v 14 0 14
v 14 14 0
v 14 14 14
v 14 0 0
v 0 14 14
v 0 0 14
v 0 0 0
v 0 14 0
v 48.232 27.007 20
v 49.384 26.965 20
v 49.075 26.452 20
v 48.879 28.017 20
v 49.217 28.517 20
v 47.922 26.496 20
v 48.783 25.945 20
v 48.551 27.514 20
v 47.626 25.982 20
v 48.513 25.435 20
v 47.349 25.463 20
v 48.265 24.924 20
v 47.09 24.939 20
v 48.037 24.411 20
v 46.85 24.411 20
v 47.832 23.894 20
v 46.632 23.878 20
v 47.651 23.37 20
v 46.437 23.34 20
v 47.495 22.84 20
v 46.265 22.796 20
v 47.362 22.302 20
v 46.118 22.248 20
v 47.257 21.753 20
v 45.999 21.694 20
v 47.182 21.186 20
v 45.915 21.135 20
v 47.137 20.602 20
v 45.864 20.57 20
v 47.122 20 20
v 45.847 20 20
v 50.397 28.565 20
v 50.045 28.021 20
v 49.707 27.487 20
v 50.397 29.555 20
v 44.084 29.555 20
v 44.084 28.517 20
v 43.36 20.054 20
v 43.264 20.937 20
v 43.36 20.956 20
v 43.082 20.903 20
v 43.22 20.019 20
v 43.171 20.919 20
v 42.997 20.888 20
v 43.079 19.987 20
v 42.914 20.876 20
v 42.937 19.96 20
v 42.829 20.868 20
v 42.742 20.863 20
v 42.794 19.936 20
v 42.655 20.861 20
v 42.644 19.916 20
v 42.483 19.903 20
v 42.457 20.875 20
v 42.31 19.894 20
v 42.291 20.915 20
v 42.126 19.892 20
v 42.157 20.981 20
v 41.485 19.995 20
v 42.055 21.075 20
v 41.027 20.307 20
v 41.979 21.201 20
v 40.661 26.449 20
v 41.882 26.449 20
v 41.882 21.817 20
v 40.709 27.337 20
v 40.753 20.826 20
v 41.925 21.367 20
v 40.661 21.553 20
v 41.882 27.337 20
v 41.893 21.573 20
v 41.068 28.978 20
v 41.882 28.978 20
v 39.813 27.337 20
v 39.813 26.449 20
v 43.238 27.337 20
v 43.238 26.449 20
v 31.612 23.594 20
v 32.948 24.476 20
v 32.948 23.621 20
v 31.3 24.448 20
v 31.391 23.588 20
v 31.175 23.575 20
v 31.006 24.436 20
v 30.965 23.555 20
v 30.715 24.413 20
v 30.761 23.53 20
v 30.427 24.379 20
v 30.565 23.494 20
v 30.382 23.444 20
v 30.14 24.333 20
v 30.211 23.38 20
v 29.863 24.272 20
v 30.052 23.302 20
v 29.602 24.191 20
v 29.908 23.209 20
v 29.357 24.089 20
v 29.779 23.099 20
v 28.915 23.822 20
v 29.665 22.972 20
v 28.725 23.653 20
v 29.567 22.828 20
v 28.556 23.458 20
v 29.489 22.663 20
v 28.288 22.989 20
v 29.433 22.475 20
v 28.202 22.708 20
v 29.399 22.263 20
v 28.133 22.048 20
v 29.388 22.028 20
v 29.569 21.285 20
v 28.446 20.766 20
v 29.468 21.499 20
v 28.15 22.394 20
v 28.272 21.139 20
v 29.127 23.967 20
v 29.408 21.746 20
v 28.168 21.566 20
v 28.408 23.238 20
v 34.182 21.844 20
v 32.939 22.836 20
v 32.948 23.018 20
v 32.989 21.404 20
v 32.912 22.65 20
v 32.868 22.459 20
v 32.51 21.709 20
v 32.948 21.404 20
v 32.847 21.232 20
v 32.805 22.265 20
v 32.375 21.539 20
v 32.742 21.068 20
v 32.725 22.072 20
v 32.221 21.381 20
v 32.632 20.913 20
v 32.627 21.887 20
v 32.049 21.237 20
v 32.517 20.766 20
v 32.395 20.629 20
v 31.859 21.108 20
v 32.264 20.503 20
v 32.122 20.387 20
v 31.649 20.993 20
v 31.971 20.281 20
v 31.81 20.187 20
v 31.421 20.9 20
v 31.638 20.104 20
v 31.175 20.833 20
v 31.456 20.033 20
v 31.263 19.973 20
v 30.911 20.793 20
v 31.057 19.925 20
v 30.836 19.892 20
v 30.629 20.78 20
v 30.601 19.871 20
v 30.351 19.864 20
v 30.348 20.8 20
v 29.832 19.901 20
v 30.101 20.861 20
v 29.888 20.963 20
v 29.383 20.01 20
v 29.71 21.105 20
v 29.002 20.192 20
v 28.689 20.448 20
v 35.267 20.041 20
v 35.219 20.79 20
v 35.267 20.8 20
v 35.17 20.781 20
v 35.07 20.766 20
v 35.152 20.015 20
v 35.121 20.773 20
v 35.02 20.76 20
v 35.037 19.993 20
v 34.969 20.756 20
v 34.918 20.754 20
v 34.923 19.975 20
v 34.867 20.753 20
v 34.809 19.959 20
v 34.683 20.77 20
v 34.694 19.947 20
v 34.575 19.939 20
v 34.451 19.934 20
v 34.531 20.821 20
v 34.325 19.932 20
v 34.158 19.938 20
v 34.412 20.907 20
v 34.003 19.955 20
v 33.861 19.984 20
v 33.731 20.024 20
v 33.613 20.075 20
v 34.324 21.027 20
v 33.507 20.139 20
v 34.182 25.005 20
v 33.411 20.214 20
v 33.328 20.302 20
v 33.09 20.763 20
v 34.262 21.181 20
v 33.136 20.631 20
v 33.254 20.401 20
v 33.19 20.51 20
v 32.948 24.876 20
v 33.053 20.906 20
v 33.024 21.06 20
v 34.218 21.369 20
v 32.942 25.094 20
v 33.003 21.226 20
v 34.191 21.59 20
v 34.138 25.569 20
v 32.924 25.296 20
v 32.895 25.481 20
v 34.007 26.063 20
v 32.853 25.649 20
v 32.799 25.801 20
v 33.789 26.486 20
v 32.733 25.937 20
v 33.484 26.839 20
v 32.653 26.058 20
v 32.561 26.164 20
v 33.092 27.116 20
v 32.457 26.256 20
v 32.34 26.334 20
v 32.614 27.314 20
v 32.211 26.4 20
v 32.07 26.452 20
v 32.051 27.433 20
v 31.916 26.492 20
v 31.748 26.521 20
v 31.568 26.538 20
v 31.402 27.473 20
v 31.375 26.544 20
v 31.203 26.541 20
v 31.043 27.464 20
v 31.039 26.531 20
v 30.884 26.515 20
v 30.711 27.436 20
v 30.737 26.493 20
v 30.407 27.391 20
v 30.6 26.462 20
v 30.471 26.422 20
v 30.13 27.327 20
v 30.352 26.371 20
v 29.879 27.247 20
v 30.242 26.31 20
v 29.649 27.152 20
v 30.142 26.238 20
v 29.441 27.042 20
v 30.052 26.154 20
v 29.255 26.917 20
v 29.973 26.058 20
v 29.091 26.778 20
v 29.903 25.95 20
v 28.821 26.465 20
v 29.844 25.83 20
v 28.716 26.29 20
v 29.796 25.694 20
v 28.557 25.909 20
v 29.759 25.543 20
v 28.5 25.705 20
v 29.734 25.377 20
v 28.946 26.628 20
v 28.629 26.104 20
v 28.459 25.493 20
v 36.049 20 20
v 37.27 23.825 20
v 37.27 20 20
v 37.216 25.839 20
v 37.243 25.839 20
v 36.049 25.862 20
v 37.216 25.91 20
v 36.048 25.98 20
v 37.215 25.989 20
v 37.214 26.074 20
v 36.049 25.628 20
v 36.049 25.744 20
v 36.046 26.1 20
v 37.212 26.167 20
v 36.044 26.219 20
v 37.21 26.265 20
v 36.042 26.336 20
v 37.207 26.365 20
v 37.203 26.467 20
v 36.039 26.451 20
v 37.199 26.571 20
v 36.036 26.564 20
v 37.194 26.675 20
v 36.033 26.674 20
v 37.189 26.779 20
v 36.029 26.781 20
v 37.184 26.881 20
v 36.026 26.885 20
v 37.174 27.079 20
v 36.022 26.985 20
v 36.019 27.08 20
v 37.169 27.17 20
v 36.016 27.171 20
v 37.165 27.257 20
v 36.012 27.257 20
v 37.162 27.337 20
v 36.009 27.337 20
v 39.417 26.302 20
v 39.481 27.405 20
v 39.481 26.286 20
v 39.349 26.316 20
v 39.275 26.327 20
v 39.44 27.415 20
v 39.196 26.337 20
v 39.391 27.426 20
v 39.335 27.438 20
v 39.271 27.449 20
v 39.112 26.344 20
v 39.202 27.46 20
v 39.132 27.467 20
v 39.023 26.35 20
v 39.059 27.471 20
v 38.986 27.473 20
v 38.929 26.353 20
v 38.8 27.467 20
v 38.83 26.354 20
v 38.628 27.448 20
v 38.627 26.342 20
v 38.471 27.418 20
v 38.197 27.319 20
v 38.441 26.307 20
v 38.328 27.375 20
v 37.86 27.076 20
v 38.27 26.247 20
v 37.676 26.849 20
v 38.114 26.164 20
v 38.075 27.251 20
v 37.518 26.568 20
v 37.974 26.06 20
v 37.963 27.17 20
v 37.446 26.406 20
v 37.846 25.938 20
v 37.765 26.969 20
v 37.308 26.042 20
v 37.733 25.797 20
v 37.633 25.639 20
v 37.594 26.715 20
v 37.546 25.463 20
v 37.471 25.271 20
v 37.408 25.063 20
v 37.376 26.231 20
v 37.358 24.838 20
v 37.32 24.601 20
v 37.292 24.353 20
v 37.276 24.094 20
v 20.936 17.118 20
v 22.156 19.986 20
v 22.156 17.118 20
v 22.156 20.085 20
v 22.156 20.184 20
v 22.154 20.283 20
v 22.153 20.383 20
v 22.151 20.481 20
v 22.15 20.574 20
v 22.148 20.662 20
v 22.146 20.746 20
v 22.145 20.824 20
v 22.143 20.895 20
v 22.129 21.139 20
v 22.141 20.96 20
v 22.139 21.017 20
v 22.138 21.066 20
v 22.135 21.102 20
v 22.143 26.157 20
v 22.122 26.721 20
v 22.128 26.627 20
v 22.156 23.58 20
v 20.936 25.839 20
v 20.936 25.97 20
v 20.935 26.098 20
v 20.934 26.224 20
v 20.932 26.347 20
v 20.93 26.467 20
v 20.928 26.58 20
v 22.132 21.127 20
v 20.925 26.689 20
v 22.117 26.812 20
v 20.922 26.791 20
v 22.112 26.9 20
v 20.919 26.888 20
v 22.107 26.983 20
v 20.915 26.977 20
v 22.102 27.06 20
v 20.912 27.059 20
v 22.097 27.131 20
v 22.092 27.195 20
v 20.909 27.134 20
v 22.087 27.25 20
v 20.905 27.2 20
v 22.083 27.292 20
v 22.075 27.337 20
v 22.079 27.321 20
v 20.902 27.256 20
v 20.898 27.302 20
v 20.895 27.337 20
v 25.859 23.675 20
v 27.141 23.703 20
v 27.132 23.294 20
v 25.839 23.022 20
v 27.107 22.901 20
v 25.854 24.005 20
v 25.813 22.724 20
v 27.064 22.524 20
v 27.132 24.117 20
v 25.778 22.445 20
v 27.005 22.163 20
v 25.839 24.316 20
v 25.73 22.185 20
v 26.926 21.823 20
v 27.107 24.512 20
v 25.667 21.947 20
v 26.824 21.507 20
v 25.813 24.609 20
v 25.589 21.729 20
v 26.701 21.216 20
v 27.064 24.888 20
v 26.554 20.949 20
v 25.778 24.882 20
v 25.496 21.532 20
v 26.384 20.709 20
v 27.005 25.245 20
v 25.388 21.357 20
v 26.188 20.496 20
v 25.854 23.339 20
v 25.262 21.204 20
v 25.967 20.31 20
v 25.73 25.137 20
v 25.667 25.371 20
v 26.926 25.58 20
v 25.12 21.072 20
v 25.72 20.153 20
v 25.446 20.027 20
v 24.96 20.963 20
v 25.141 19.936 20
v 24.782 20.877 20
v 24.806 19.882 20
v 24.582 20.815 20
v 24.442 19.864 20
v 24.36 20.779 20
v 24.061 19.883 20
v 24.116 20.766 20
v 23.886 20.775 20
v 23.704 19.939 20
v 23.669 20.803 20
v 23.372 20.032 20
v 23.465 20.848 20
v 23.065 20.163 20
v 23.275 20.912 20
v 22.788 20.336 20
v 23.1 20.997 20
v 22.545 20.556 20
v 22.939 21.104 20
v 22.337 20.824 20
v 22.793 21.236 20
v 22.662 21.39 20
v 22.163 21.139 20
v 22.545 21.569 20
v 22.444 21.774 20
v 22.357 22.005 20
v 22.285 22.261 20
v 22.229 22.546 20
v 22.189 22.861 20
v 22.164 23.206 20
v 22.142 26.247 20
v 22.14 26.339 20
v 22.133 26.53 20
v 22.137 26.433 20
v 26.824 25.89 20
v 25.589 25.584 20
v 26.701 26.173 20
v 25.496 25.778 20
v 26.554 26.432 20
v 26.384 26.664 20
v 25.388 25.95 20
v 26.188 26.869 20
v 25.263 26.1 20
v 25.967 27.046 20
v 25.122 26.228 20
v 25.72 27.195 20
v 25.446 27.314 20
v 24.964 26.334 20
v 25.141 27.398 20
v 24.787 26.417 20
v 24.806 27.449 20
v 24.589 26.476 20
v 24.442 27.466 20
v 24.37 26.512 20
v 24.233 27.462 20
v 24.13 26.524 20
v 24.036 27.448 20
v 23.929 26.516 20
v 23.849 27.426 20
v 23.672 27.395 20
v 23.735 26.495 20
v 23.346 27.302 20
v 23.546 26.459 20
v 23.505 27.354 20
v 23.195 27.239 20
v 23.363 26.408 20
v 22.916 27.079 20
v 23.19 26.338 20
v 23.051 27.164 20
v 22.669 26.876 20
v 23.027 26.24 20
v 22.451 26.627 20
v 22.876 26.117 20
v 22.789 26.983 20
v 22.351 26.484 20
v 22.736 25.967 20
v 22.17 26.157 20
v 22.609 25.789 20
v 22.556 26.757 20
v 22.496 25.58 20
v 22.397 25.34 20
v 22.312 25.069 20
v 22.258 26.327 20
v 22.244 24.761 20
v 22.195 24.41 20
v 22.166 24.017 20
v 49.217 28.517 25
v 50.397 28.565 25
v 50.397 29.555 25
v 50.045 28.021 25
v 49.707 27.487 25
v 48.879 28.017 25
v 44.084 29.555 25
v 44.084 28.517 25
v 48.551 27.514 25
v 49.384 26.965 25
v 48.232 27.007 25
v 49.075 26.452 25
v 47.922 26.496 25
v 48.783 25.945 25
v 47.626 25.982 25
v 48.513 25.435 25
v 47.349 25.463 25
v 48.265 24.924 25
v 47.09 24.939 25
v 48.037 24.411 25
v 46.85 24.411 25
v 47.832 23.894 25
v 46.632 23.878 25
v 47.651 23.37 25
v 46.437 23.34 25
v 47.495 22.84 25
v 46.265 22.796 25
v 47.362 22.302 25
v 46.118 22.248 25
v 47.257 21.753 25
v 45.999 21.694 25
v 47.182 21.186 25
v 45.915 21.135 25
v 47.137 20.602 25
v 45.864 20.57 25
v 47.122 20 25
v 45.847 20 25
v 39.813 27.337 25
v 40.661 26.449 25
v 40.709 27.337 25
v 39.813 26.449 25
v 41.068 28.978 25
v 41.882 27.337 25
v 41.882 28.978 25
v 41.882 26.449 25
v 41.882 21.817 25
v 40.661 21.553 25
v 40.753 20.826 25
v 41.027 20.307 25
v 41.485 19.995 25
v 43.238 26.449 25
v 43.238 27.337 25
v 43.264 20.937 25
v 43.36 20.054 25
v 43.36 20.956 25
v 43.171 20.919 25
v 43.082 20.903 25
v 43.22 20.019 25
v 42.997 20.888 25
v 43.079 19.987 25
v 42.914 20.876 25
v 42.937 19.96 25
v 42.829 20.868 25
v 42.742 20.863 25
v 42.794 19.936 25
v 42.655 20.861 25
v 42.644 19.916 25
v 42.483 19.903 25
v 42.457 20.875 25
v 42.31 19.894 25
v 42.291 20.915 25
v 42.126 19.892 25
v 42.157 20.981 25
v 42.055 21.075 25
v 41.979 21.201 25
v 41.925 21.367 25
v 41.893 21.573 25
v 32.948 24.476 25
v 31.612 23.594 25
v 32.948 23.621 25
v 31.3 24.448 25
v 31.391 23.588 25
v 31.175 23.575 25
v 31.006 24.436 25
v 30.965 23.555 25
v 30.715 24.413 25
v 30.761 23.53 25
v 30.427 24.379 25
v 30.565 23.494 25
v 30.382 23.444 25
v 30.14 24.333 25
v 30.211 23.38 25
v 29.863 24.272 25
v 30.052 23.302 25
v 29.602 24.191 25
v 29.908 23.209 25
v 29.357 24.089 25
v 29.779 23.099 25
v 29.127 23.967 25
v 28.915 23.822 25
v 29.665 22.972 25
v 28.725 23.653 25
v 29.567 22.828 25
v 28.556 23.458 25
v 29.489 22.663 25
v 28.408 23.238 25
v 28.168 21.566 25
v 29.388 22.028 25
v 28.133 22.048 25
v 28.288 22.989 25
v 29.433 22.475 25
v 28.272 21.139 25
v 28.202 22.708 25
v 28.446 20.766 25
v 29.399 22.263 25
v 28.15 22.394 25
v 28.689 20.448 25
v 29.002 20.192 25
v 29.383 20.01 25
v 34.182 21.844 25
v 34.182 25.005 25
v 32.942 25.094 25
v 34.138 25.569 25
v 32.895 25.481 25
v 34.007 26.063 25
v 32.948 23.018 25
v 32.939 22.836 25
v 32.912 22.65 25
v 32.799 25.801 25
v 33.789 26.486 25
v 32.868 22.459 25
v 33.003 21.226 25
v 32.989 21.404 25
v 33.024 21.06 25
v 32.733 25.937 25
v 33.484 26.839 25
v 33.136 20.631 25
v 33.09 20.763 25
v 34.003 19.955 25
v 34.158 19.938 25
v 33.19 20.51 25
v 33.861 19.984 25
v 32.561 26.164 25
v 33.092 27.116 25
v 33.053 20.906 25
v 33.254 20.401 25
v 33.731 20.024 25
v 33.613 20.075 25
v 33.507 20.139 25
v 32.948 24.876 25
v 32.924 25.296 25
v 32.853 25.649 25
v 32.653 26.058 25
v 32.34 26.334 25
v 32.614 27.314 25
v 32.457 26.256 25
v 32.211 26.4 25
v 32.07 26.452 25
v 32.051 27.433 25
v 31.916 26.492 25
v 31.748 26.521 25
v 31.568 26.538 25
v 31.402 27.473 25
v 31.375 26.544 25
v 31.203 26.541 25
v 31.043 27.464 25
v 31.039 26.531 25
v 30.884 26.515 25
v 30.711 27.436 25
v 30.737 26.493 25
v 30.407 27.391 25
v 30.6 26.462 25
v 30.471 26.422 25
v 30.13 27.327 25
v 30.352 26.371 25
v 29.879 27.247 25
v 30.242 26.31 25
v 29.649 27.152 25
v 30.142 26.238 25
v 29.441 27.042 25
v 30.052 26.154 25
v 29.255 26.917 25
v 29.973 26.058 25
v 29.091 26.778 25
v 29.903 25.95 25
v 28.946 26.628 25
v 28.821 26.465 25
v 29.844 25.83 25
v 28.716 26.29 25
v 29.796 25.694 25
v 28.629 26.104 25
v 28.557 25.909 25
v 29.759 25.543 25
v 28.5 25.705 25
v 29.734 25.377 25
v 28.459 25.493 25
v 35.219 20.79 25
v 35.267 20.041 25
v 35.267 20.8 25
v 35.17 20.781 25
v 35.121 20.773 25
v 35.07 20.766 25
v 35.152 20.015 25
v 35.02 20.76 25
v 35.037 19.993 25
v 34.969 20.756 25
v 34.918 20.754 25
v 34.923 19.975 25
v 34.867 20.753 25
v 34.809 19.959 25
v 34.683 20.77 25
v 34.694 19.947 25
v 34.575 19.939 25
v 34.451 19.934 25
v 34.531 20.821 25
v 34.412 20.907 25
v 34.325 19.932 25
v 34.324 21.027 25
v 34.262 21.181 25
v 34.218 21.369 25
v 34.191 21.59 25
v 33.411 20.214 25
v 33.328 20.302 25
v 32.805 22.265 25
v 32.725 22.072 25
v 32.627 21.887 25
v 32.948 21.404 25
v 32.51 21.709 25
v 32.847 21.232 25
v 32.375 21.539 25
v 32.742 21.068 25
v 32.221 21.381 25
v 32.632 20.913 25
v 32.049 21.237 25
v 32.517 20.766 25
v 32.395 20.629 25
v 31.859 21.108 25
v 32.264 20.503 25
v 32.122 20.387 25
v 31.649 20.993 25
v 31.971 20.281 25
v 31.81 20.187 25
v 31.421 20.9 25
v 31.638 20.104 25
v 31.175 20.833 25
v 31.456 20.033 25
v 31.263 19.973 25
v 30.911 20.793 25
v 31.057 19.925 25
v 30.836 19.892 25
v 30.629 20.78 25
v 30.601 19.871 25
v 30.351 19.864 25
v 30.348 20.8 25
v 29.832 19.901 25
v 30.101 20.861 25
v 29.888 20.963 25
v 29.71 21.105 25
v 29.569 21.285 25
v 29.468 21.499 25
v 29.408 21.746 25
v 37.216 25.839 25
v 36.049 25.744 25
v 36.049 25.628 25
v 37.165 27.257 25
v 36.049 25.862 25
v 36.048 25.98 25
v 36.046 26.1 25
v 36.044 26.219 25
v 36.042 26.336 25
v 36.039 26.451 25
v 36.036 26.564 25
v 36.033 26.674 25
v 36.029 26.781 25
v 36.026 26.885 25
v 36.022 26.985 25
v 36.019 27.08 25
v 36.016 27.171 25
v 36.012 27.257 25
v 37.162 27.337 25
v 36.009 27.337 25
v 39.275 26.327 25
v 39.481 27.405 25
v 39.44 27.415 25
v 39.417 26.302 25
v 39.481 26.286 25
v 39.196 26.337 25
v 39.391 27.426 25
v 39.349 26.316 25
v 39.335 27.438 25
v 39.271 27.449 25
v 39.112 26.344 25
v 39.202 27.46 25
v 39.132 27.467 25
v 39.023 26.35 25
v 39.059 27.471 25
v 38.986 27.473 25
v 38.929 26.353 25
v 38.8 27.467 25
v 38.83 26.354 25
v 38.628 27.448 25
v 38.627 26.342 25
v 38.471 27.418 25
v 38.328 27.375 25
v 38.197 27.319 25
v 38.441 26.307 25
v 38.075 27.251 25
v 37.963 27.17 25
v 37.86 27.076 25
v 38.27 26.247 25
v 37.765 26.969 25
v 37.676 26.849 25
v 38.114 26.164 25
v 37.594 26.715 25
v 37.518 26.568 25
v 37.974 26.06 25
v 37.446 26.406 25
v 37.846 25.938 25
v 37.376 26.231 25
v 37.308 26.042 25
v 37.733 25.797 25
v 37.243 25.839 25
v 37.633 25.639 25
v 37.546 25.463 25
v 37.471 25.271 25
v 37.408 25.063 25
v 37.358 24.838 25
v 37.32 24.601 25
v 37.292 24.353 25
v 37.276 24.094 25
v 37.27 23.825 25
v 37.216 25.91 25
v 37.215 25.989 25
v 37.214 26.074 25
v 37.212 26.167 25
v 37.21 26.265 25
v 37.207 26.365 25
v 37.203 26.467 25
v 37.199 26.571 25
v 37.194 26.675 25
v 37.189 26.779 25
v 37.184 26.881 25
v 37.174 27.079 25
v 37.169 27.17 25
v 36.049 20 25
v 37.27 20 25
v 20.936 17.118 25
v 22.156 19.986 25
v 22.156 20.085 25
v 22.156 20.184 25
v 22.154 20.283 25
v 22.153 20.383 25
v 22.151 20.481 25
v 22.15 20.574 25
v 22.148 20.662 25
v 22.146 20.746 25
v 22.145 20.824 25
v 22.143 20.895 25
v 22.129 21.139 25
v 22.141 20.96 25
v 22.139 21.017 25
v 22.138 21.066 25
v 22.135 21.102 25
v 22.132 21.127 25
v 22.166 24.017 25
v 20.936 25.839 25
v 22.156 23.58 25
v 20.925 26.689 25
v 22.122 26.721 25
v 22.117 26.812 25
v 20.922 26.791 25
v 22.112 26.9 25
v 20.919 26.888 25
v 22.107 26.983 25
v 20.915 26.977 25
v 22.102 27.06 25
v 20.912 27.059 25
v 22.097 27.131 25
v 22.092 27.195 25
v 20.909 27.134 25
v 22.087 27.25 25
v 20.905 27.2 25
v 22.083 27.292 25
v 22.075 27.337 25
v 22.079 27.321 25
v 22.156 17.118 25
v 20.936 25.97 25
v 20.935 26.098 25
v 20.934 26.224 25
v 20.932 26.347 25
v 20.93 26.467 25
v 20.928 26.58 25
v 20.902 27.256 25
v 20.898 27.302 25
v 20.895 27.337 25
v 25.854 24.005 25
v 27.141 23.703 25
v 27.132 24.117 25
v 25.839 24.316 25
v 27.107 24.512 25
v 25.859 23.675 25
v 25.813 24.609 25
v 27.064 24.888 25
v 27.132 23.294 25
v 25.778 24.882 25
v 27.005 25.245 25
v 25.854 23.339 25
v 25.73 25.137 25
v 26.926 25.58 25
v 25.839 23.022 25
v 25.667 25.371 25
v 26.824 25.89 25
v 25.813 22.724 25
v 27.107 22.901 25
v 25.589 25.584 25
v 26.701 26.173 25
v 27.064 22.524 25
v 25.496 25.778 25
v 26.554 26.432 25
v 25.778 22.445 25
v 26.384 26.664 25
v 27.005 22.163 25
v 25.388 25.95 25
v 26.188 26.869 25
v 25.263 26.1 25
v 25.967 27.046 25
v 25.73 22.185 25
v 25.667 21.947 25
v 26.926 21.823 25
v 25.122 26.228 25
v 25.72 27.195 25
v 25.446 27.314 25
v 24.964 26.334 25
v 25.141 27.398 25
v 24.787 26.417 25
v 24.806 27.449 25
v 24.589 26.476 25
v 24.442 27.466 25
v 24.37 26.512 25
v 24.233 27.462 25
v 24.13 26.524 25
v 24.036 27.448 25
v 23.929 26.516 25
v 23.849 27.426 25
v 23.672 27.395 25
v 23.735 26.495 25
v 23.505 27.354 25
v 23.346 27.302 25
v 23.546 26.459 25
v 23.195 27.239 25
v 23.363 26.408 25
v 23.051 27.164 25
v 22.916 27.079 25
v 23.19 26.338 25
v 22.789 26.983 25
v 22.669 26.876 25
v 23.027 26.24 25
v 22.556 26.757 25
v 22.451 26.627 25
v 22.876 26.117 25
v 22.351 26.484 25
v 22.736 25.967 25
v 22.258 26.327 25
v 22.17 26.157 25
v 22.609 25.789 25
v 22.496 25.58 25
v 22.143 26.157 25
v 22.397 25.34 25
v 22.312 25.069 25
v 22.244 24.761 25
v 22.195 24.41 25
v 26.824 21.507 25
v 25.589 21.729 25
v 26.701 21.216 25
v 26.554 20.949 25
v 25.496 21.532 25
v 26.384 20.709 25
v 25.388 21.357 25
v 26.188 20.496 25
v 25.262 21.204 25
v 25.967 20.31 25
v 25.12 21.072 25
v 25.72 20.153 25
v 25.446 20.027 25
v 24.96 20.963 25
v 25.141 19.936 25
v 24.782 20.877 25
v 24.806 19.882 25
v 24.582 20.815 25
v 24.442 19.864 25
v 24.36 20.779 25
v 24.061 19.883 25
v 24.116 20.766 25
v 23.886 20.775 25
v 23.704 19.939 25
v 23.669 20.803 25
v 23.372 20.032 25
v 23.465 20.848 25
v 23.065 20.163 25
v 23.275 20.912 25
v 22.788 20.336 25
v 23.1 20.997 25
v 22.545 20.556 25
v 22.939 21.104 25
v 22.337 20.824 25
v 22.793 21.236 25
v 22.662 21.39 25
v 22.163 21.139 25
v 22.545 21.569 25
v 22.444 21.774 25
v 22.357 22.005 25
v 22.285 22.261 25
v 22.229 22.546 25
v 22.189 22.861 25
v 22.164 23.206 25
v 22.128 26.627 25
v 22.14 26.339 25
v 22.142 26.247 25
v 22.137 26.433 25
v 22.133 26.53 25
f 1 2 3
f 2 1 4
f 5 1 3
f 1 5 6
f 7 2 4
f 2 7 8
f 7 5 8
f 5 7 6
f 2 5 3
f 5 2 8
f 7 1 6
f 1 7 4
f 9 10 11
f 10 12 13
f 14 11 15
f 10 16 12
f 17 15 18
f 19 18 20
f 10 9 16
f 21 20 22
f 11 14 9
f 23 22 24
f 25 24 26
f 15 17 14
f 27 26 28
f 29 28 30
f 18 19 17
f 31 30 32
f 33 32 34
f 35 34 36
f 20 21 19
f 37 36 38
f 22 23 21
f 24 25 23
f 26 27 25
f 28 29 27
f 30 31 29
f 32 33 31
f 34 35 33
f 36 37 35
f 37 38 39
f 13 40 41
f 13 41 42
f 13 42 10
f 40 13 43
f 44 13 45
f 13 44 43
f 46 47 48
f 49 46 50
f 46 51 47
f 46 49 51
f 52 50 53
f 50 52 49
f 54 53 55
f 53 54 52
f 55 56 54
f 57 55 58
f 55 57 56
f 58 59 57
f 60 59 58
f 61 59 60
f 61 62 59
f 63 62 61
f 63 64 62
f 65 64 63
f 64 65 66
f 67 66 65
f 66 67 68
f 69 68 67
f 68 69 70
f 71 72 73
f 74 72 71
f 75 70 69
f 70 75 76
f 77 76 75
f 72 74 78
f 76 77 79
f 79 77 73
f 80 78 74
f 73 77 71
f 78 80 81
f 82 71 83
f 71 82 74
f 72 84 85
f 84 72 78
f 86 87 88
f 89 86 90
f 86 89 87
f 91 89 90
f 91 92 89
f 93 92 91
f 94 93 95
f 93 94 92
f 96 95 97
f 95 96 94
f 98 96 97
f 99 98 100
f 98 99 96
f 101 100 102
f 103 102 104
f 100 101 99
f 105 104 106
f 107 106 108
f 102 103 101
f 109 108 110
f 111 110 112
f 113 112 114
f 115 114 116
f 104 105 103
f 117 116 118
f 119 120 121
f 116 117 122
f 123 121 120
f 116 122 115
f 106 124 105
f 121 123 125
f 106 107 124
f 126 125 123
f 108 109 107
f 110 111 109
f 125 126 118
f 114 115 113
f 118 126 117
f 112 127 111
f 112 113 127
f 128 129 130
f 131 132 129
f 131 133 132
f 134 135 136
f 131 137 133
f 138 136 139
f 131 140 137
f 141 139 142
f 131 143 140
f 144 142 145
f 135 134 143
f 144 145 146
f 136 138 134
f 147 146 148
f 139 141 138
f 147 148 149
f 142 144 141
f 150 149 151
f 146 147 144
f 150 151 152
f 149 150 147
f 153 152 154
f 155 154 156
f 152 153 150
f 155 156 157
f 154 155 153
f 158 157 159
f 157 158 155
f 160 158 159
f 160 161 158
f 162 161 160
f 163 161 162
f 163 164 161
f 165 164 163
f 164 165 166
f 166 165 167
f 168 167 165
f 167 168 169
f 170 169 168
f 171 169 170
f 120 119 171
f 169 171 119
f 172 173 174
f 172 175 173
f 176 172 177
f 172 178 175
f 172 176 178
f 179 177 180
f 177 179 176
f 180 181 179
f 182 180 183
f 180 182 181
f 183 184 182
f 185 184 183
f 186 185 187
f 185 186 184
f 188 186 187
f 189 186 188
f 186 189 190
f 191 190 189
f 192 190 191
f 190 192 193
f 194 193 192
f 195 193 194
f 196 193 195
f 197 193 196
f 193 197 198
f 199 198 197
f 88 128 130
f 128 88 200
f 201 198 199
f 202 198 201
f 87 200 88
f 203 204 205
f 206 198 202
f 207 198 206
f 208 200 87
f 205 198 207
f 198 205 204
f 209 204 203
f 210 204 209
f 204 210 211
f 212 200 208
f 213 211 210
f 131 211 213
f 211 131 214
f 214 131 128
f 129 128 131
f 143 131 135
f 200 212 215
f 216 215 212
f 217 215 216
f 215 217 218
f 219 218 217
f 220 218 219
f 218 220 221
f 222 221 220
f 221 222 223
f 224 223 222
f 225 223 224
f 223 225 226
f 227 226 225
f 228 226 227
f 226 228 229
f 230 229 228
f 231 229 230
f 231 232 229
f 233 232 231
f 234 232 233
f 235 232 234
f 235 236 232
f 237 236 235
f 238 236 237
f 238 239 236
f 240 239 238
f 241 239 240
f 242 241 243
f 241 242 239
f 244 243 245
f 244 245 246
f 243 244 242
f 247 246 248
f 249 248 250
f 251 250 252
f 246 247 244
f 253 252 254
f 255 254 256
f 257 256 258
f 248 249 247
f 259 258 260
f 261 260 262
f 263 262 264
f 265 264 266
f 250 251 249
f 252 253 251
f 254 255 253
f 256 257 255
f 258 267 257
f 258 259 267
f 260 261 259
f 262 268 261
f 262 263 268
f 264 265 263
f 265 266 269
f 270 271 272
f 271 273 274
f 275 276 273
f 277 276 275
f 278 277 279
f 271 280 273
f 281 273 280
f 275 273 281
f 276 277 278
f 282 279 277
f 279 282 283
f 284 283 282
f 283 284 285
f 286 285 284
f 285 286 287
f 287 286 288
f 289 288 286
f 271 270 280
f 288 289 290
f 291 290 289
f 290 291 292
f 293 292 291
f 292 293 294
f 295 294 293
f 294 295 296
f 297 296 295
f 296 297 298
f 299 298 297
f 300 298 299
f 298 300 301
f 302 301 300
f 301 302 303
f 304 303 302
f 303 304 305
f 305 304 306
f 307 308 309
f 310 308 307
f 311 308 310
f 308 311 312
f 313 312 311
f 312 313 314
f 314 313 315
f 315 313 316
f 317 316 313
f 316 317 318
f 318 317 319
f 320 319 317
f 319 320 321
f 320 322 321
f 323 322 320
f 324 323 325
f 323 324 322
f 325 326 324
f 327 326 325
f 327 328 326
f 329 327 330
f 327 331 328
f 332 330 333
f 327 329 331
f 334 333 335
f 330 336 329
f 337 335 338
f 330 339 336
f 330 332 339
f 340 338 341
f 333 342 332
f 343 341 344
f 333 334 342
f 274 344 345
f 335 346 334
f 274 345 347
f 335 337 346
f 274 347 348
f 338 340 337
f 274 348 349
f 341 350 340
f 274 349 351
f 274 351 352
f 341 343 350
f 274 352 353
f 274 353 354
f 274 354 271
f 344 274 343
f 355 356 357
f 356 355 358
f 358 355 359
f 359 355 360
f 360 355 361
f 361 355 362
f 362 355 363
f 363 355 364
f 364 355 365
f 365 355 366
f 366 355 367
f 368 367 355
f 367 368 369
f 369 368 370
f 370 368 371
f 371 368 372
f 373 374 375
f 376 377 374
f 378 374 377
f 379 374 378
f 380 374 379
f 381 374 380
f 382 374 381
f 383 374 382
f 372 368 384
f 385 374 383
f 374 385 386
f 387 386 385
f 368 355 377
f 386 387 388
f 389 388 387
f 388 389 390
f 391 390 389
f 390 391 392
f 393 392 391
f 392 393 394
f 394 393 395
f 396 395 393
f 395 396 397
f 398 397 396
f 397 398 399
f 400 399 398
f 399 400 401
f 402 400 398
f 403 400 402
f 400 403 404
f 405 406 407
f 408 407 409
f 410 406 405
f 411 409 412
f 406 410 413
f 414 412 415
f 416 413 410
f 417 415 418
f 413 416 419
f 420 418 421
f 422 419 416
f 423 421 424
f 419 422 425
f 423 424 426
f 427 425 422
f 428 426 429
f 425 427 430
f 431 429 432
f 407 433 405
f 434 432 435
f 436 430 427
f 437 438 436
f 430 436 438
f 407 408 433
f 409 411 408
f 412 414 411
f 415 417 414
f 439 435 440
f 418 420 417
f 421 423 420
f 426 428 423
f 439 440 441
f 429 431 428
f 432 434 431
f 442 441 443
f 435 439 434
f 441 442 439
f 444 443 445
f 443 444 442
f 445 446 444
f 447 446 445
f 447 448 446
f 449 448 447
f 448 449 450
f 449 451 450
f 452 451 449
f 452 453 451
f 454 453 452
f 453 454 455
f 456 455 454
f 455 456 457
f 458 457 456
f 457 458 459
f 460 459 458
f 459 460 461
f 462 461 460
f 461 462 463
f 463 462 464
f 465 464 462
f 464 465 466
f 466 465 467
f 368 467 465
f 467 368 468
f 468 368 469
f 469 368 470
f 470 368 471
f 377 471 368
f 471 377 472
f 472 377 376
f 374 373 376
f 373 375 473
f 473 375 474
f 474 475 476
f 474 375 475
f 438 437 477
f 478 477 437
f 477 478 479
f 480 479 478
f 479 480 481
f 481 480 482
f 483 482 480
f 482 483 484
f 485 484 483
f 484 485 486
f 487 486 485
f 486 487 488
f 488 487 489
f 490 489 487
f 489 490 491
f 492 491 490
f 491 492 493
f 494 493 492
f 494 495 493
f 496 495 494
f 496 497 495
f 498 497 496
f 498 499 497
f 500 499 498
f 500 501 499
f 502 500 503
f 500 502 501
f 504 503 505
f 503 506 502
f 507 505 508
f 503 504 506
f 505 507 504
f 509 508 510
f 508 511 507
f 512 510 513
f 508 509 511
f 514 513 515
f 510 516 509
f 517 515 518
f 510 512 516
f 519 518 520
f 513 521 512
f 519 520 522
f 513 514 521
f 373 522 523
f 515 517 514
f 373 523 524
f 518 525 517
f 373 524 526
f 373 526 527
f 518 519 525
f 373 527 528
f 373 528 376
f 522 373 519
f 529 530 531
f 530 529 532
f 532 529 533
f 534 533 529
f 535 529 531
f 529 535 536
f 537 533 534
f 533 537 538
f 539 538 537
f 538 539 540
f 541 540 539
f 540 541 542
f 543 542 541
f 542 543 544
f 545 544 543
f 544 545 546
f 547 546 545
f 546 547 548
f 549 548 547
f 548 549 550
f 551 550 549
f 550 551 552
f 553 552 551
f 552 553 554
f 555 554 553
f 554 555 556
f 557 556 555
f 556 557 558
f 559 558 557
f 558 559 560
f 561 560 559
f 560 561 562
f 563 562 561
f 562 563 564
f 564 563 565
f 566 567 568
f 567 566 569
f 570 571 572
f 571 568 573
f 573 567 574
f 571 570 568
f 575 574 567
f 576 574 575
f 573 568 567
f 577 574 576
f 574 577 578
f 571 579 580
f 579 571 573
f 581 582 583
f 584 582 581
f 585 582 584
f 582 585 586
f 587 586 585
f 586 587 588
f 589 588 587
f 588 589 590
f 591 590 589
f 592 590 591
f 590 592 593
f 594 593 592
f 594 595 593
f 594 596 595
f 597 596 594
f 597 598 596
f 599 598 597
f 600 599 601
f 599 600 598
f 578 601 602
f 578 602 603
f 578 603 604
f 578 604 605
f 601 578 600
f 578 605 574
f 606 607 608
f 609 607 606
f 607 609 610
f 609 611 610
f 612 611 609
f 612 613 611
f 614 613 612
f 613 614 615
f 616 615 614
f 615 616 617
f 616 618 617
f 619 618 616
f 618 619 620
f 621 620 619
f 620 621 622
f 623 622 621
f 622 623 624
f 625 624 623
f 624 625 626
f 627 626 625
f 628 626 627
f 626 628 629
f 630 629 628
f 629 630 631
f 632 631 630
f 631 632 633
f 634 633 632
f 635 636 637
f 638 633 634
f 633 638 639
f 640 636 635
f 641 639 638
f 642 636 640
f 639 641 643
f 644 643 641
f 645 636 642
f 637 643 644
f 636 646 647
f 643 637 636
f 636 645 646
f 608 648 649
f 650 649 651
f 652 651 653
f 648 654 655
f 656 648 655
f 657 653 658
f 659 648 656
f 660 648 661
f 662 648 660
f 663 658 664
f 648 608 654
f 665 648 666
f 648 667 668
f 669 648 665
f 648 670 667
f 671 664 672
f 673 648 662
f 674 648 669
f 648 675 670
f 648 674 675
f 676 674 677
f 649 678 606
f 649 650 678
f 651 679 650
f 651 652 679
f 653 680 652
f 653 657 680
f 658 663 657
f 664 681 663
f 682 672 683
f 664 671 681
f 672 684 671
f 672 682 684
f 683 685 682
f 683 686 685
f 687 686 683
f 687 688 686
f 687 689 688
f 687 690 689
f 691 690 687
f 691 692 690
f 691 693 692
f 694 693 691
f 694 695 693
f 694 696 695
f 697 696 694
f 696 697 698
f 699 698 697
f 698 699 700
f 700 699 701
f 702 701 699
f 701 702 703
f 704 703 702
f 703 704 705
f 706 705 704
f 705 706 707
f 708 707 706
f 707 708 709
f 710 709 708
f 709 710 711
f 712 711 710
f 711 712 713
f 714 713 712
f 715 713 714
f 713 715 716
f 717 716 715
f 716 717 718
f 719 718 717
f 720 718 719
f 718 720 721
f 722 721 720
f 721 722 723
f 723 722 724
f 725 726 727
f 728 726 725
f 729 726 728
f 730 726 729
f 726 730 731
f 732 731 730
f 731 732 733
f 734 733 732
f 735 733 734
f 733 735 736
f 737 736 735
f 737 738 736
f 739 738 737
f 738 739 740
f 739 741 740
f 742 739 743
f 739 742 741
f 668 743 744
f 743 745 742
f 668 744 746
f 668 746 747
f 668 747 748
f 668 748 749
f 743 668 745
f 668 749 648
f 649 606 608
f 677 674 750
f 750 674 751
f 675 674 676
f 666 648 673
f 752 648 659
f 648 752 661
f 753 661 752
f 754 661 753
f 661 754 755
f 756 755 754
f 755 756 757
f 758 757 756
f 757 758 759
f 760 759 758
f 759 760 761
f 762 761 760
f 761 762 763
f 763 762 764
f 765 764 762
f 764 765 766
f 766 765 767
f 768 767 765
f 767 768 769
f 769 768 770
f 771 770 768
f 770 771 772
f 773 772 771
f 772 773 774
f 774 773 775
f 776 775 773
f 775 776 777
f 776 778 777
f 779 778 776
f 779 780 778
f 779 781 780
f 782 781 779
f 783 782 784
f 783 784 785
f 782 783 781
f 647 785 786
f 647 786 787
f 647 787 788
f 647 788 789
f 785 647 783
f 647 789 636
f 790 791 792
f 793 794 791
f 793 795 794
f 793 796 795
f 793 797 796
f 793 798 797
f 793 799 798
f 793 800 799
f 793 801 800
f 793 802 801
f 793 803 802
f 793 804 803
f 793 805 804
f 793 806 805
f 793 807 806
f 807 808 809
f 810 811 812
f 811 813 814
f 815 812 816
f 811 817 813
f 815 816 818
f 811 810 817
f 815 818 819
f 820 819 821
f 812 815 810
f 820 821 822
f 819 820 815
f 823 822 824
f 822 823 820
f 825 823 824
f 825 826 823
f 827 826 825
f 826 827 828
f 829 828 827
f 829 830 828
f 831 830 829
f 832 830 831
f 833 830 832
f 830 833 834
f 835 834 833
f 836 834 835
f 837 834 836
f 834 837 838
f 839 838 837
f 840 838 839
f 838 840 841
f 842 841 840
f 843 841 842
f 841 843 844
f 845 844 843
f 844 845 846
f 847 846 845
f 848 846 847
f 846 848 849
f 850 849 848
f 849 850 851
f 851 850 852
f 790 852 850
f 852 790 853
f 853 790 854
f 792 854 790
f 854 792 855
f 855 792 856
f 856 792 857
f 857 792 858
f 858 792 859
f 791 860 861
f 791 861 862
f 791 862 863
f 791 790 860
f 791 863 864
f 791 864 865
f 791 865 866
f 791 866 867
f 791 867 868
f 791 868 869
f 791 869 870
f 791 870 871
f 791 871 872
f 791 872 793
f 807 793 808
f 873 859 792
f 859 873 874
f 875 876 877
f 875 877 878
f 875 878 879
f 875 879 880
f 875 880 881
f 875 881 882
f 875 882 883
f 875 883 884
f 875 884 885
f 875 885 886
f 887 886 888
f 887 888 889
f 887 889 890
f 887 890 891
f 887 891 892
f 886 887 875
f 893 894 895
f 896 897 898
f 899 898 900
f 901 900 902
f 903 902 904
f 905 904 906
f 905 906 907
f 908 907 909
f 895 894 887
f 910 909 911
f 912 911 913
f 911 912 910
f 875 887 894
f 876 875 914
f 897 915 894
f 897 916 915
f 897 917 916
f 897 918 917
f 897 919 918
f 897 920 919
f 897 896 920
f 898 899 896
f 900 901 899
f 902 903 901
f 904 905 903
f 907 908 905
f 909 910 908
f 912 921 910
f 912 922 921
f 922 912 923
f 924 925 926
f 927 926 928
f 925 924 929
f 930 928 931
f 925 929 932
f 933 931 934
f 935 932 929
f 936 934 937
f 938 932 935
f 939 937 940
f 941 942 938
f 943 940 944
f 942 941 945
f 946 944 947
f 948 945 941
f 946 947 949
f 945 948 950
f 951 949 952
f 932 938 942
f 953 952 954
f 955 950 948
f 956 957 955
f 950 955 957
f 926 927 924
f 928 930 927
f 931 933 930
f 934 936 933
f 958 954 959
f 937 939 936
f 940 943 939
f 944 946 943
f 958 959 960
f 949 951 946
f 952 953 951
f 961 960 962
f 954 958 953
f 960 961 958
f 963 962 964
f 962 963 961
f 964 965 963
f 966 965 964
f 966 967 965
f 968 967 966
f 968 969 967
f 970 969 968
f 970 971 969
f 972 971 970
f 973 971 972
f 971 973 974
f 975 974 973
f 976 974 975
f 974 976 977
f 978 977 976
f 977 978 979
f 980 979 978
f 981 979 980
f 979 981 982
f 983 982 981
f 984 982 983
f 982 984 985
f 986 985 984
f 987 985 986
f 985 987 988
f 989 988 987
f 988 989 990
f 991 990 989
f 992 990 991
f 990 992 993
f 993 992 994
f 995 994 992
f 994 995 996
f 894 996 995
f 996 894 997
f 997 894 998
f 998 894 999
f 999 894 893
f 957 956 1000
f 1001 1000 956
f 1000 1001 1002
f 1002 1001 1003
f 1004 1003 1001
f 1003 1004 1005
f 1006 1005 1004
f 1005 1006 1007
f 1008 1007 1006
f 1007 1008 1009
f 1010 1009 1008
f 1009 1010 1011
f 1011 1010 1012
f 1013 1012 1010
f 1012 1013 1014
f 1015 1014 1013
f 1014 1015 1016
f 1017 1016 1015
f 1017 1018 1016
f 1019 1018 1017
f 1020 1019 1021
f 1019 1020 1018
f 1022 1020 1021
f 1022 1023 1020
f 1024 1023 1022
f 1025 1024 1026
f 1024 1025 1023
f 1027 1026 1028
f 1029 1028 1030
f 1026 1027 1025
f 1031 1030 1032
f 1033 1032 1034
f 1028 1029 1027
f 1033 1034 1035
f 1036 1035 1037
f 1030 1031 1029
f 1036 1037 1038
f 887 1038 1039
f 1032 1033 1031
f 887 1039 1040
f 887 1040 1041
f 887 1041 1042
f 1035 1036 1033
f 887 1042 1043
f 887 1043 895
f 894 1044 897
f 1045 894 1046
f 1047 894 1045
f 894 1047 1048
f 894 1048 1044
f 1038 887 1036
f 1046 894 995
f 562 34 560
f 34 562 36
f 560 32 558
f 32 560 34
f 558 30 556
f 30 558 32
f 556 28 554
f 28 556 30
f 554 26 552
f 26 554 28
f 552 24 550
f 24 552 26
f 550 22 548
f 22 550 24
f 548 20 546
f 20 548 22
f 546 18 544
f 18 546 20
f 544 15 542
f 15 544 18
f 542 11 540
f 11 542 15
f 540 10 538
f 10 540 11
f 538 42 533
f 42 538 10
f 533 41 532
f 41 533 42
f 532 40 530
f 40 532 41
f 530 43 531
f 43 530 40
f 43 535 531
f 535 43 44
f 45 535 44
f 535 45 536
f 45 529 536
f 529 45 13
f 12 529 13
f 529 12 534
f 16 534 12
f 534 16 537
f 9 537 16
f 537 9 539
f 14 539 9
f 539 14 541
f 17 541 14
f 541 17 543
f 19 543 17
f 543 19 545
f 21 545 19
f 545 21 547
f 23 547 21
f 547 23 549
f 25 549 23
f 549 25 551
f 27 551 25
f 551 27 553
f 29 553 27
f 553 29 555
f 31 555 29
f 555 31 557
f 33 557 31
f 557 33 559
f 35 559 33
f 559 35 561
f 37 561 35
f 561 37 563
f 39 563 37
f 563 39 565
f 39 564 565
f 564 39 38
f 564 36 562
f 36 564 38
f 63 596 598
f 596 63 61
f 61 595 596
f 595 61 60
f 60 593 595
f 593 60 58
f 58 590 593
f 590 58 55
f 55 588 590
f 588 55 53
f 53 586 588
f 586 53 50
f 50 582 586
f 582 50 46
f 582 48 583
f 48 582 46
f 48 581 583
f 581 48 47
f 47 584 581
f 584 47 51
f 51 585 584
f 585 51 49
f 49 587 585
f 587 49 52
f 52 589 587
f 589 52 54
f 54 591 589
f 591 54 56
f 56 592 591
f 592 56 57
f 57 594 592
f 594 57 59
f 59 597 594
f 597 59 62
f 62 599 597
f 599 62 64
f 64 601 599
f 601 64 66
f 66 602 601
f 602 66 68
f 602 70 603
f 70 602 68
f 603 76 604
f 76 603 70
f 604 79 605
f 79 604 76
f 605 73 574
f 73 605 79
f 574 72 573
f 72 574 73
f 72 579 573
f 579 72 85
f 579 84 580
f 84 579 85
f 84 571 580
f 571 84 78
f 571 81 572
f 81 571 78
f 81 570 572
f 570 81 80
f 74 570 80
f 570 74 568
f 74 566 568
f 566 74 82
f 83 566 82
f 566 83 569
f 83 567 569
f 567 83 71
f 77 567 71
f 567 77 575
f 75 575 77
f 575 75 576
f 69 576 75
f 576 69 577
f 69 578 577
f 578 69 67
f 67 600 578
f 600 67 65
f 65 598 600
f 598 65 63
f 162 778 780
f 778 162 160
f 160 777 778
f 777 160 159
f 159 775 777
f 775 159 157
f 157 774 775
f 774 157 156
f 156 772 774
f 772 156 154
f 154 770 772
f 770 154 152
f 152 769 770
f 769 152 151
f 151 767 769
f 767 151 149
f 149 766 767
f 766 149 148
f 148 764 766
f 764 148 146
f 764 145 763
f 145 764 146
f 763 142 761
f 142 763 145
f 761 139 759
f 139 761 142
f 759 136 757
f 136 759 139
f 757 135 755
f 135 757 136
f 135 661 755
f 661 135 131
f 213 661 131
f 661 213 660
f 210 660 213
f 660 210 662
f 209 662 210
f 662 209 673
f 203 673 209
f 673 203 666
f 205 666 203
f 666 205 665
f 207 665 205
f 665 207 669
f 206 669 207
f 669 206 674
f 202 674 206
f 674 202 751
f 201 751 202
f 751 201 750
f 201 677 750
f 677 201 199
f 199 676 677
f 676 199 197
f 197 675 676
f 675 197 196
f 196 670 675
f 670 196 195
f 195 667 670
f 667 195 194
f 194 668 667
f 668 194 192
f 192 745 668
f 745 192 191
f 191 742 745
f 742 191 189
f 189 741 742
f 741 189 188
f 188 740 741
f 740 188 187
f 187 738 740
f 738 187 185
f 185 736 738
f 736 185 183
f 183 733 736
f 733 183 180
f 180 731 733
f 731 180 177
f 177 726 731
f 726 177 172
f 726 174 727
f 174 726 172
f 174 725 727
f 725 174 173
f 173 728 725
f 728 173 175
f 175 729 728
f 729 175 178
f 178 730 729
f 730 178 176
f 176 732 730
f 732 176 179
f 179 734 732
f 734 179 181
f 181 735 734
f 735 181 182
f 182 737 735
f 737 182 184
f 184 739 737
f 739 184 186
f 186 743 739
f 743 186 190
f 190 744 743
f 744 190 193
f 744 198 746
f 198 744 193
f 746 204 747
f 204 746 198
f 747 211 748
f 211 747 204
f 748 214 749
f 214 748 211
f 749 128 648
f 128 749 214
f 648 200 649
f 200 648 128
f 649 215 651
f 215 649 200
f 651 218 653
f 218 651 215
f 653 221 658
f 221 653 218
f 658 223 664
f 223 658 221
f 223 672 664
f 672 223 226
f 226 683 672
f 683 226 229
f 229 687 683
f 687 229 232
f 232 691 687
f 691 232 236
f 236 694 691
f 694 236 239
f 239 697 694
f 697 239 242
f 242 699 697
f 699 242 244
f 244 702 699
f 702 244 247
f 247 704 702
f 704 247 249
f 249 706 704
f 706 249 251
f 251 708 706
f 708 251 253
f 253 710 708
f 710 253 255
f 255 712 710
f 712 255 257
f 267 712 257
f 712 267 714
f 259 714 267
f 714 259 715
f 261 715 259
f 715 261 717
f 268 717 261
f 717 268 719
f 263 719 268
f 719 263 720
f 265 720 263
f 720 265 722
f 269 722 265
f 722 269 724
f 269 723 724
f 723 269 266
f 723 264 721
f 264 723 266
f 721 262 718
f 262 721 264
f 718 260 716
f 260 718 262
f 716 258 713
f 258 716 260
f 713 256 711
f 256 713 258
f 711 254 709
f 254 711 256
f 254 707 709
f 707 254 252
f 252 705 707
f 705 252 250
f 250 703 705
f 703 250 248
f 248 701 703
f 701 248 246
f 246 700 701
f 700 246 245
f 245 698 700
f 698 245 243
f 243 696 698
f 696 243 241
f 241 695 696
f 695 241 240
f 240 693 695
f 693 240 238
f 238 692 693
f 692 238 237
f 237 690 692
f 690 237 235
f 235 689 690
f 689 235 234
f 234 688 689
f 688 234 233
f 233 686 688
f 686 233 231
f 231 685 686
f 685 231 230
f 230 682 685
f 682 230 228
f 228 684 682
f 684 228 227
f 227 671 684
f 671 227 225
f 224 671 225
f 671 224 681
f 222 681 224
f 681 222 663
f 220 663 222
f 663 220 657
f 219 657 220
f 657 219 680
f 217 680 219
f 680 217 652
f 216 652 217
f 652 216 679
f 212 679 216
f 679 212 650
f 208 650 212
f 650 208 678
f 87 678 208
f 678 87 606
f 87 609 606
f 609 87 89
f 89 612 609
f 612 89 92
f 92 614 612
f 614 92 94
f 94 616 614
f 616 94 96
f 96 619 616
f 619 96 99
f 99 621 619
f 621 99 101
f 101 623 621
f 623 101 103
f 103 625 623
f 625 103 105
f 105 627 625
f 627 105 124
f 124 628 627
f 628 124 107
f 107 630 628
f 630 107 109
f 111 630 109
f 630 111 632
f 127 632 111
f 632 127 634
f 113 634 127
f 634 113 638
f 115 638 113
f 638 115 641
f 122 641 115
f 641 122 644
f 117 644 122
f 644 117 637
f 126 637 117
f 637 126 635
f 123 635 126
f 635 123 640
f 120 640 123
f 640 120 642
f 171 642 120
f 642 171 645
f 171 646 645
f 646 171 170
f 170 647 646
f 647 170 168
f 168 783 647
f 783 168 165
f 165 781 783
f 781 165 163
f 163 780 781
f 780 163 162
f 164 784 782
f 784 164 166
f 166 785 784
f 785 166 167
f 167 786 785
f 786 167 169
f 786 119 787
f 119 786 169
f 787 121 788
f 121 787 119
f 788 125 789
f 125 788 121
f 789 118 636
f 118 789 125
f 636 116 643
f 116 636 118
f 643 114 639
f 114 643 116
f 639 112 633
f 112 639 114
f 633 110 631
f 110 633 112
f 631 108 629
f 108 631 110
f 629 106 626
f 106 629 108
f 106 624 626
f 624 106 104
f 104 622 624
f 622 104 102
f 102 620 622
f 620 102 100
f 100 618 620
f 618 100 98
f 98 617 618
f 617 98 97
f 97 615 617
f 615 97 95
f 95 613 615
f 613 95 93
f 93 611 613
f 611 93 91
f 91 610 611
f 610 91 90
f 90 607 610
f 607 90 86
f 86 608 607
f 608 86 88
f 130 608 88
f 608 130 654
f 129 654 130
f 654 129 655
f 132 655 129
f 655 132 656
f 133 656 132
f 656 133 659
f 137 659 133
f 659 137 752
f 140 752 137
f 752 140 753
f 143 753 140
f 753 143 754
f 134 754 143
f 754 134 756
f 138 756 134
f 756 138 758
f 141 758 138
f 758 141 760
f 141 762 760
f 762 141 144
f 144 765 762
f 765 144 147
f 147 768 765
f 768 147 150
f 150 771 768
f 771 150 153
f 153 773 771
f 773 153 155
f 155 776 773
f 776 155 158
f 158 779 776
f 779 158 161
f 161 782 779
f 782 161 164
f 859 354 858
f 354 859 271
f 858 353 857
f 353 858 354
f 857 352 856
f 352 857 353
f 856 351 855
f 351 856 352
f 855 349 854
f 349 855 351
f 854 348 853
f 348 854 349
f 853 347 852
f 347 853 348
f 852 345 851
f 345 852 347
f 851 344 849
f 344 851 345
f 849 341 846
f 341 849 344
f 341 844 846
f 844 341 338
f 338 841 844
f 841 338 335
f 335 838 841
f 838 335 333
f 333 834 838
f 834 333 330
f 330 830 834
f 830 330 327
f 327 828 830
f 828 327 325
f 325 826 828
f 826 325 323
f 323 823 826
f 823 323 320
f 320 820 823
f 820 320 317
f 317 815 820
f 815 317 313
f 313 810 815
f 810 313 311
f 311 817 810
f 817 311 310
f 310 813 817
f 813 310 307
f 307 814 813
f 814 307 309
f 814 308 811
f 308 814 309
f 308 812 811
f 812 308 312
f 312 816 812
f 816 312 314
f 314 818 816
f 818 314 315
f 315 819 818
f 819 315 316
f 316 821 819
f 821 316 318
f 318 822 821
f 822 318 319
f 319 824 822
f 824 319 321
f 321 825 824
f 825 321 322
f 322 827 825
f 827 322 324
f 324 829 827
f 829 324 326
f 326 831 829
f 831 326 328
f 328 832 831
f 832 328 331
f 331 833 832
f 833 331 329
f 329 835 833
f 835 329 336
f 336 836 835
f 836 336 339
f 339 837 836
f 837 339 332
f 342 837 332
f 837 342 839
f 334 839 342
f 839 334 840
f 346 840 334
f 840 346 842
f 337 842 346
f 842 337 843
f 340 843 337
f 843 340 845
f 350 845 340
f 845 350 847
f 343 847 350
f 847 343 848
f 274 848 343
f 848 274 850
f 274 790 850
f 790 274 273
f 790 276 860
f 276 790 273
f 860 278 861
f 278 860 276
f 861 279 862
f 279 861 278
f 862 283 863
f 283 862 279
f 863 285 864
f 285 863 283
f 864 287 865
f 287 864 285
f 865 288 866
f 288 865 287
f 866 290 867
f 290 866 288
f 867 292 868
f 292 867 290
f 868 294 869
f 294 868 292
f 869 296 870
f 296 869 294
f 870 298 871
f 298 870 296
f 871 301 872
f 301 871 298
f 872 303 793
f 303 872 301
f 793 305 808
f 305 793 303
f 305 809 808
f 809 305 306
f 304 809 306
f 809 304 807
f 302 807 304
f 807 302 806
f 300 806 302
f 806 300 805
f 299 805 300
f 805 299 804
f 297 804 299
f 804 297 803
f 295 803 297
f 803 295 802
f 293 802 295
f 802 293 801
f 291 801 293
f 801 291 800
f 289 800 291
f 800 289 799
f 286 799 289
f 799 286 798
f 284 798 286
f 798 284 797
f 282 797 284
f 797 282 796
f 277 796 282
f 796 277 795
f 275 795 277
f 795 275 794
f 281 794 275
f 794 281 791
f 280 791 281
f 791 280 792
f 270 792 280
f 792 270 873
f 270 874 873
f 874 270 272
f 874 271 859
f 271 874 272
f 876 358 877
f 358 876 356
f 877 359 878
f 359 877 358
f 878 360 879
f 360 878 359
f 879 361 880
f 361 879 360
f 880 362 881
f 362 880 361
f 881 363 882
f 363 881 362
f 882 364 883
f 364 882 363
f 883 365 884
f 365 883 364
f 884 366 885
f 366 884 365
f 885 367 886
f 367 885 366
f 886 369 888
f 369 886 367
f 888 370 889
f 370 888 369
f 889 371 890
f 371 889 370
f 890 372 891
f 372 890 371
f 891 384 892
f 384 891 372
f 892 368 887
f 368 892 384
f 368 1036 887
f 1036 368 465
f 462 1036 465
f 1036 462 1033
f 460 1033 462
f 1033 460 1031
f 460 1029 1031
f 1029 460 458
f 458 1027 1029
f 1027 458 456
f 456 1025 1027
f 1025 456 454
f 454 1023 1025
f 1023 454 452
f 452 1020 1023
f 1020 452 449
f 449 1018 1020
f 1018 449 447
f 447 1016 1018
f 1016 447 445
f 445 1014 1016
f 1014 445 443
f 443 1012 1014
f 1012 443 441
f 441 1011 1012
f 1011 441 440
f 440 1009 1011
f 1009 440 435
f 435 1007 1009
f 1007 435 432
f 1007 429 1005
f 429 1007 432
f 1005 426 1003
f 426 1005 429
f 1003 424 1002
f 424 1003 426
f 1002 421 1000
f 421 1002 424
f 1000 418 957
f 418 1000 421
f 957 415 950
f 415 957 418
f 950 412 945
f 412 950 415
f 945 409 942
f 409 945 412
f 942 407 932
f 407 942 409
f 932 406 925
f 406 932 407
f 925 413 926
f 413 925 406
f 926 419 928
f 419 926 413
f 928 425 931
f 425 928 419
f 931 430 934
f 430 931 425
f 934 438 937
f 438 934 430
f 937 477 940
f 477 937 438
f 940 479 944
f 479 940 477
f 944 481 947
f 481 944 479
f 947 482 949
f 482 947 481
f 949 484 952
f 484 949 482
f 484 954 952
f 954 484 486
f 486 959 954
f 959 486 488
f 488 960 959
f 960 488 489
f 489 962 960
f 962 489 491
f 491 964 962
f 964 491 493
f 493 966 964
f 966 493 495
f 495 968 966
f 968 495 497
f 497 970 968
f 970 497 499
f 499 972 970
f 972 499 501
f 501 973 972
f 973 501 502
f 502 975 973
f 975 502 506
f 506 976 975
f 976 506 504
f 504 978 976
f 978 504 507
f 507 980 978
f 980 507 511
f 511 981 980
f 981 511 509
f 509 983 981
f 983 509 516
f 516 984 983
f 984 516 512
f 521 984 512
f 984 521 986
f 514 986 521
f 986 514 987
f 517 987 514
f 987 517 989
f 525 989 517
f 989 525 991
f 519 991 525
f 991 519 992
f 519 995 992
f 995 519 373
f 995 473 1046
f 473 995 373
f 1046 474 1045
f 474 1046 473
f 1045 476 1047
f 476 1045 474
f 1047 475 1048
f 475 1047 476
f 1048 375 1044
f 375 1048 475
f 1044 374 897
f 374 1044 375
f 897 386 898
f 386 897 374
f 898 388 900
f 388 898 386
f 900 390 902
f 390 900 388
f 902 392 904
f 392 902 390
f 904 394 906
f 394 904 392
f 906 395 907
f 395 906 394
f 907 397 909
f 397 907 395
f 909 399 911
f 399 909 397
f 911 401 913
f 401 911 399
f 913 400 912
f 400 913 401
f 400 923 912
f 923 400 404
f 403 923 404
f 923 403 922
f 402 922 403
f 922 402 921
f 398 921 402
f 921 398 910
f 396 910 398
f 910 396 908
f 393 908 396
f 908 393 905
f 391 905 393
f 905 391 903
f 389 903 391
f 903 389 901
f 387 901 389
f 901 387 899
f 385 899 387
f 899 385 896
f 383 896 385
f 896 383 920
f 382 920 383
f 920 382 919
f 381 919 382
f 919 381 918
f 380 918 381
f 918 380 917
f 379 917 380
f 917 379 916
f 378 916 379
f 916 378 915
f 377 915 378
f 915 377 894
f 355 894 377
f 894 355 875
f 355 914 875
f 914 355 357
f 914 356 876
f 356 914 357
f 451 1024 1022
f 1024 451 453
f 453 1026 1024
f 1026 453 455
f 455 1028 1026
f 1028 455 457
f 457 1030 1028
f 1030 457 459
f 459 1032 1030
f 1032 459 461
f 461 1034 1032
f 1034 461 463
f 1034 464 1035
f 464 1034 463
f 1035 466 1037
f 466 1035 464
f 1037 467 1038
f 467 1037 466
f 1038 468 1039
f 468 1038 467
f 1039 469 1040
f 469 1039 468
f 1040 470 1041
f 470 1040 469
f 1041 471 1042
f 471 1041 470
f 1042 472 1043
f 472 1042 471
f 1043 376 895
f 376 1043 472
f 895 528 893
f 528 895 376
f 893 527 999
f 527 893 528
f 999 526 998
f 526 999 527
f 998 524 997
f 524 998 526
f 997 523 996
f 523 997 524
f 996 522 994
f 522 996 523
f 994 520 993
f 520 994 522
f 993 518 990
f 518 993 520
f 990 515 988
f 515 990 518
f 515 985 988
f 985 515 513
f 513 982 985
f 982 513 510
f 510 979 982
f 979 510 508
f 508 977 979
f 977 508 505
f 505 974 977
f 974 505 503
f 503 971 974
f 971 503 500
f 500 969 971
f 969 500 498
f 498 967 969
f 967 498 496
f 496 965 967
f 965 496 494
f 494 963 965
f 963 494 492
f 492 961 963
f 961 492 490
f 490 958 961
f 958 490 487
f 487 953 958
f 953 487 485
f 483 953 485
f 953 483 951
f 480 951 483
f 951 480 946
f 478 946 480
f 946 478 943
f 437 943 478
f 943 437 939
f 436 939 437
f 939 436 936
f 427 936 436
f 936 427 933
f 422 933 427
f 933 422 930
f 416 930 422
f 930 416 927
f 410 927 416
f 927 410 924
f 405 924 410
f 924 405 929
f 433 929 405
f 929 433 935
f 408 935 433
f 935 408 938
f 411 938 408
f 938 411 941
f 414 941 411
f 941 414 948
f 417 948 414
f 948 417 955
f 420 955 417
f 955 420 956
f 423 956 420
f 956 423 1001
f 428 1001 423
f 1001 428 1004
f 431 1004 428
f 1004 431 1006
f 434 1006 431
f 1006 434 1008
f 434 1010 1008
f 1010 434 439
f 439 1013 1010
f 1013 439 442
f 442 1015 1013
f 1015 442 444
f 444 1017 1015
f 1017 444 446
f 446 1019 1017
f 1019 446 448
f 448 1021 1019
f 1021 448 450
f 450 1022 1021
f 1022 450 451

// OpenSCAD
//[CUSTOMIZATION]
// X Dimension
xdim=14;
// Y Dimension
ydim=17;
// Z Dimension
zdim=14;
// Message
txt="part7";
module __END_CUSTOMIZATIONS () {}
cube(xdim,ydim,zdim);
translate([20,20,20]) { linear_extrude(5) text(txt, font="Liberation Sans"); }
